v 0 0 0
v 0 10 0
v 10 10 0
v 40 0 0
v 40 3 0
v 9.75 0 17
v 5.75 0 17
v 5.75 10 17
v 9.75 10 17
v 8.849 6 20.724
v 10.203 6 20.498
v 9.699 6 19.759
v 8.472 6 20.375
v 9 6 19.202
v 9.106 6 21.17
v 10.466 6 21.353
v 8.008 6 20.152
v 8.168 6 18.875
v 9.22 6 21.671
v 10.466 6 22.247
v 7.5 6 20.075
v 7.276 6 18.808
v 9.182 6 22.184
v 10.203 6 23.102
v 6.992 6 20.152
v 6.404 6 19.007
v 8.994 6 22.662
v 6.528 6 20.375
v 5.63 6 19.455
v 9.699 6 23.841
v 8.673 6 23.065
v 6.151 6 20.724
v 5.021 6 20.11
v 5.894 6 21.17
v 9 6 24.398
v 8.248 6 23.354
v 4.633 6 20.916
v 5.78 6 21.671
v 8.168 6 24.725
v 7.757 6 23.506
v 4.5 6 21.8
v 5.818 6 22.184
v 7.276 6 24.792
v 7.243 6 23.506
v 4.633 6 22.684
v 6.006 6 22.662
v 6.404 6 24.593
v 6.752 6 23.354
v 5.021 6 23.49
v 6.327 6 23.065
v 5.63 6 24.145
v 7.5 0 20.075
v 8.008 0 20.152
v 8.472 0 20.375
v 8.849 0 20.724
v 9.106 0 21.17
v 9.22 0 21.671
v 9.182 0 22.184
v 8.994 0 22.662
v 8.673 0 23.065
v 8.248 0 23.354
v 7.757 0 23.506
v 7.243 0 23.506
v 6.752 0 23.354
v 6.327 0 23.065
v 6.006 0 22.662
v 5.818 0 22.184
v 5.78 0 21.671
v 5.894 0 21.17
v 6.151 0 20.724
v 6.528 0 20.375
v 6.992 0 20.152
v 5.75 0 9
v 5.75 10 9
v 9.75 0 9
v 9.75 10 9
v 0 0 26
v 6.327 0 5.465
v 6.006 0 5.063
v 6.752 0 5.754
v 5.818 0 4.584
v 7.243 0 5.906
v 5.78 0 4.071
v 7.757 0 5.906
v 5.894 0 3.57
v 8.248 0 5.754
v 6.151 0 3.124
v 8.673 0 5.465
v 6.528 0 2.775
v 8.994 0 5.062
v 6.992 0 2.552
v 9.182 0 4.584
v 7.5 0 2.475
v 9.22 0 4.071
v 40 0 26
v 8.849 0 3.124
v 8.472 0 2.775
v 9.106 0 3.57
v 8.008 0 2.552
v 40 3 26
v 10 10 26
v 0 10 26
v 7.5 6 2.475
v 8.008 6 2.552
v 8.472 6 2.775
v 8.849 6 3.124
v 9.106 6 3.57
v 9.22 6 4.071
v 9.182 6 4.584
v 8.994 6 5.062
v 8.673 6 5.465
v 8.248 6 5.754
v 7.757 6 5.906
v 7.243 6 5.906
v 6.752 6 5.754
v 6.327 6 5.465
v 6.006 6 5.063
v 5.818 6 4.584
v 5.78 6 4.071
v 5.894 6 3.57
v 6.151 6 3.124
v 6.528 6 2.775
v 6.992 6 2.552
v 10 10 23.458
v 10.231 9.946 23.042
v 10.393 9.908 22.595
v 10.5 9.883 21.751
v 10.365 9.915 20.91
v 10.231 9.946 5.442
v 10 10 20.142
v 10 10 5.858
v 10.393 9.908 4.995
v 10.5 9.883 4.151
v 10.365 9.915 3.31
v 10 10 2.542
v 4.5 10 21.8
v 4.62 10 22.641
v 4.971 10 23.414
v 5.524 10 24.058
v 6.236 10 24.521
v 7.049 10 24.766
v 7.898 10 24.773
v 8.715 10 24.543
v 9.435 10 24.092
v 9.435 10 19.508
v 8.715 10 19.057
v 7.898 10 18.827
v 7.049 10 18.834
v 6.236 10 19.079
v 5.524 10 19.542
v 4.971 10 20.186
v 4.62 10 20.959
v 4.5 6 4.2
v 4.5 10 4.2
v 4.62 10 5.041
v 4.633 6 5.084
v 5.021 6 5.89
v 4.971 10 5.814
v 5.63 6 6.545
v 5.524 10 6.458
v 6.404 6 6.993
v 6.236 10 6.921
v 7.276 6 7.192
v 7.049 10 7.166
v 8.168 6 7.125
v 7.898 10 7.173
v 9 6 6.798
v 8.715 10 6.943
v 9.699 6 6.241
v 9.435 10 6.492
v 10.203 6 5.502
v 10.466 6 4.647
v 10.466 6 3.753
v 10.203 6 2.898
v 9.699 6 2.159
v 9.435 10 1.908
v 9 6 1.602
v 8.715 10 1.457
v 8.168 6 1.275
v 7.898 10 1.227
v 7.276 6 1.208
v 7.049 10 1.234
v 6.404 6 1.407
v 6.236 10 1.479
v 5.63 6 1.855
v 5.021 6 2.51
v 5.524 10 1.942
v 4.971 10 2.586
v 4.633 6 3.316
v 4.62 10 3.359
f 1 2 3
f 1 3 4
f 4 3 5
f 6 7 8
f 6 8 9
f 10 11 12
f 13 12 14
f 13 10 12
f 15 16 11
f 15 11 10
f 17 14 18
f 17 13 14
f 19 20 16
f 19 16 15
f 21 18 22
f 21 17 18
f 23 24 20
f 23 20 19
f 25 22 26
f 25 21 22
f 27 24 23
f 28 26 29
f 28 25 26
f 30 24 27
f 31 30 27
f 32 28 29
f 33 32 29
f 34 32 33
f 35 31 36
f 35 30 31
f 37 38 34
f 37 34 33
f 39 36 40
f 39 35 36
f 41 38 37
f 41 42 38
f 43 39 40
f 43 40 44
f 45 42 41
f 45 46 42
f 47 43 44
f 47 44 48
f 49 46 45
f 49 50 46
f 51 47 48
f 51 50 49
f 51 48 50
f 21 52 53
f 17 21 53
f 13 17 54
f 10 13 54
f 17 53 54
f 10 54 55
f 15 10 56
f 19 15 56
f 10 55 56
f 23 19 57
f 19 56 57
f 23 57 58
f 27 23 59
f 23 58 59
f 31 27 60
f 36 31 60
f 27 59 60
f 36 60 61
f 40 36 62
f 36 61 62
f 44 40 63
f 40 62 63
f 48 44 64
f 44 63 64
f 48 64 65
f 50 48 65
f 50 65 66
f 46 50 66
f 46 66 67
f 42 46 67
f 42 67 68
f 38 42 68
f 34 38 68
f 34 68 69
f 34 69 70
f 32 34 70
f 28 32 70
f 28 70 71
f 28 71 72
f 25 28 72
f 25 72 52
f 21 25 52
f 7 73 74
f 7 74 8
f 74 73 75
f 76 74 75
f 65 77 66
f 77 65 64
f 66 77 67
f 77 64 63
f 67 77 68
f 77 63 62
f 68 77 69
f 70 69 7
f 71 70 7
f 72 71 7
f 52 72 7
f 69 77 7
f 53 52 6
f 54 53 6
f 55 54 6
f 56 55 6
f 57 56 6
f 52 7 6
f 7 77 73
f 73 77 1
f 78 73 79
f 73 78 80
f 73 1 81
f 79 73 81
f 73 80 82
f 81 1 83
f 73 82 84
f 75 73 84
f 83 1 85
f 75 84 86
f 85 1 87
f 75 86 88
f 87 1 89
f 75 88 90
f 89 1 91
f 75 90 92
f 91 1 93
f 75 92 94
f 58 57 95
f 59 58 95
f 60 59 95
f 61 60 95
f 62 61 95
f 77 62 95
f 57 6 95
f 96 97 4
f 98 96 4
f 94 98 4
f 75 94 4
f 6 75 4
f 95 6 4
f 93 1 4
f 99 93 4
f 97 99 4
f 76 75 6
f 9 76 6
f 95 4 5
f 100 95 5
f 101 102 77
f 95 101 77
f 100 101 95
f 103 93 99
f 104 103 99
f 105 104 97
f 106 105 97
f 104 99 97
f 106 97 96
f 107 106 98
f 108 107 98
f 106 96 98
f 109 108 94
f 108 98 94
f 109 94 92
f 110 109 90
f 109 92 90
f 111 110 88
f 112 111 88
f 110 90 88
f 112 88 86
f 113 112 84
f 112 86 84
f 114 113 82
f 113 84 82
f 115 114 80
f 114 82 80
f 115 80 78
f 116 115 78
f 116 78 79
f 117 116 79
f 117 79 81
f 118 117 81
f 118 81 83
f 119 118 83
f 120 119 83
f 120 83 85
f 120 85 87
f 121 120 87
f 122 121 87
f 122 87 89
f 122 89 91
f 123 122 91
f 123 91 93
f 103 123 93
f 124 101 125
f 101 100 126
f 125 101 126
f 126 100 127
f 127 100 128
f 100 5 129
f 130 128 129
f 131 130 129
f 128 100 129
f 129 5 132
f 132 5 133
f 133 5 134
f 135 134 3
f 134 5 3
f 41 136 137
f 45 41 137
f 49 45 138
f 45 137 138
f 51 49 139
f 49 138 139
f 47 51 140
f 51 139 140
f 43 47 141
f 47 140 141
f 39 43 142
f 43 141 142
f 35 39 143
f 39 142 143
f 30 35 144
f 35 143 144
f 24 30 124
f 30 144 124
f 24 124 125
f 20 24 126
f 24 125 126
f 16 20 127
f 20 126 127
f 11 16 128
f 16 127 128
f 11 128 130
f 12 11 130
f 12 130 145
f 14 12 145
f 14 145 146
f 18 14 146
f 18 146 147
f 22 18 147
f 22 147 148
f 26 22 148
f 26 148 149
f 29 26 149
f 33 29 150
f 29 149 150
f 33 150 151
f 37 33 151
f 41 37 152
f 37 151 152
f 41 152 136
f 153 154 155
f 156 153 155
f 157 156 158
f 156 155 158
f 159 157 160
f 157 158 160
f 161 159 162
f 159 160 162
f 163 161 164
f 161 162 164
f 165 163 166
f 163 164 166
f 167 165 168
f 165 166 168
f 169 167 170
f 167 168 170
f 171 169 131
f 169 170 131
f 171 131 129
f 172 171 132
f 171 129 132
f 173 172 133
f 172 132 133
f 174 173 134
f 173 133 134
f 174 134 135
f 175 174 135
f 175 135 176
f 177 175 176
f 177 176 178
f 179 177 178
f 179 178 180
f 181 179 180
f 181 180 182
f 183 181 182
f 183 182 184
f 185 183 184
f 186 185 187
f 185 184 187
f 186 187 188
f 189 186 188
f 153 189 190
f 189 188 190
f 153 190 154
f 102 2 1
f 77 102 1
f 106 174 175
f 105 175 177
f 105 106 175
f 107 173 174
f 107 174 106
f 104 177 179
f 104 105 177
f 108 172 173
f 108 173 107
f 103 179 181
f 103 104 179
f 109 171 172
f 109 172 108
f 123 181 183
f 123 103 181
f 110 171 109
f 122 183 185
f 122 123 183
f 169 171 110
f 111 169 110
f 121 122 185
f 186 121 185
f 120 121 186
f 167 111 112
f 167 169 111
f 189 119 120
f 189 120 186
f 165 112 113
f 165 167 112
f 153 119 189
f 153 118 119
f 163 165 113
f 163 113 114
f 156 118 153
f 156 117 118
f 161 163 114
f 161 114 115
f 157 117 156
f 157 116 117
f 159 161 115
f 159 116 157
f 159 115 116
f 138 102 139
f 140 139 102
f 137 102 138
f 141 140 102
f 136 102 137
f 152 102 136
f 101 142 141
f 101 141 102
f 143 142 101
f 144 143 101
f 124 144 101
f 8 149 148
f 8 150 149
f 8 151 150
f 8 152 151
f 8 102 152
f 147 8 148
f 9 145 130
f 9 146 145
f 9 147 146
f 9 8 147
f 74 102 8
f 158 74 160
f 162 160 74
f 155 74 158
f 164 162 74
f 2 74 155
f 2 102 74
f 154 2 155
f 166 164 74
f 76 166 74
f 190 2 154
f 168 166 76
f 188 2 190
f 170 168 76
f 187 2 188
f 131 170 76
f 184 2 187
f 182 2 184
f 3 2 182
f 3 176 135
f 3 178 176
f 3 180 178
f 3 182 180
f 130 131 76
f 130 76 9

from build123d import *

# Parameters (mm, degrees)
SKETCH1_W           = 40
SKETCH1_H           = 3
SKETCH1_W_2         = 10
SKETCH1_H_2         = 7
BOSS_EXTRUDE1_DEPTH = 26
SKETCH3_R           = 1.725
SKETCH3_W           = 4
SKETCH3_H           = 8
CUT_EXTRUDE1_DEPTH  = 49.744230428
SKETCH4_R           = 3
CUT_EXTRUDE2_DEPTH  = 4


with BuildPart() as part:
    # Sketch1 → Boss-Extrude1 (new body)
    with BuildSketch(Plane.XY):
        with Locations((20, 1.5)):
            Rectangle(SKETCH1_W, SKETCH1_H)
        Polygon((40, 3), (10, 10), (10, 3), align=None)
        with Locations((5, 6.5)):
            Rectangle(SKETCH1_W_2, SKETCH1_H_2)
    extrude(amount=BOSS_EXTRUDE1_DEPTH)

    # Sketch3 → Cut-Extrude1 (cut, through all)
    with BuildSketch(Plane.XZ):
        with Locations(Location((7.5, 21.8, 0), (0, 0, 270))):
            Circle(SKETCH3_R)
        with Locations(Location((7.5, 4.2, 0), (0, 0, 270))):
            Circle(SKETCH3_R)
        with Locations((7.75, 13)):
            Rectangle(SKETCH3_W, SKETCH3_H)
    extrude(amount=-CUT_EXTRUDE1_DEPTH, mode=Mode.SUBTRACT)

    # Sketch4 → Cut-Extrude2 (cut)
    with BuildSketch(Plane(origin=(0, 10, 0), x_dir=(1, 0, 0), z_dir=(0, 1, 0))):
        with Locations(Location((7.5, -4.2, 0), (0, 0, 180))):
            Circle(SKETCH4_R)
        with Locations(Location((7.5, -21.8, 0), (0, 0, 180))):
            Circle(SKETCH4_R)
    extrude(amount=-CUT_EXTRUDE2_DEPTH, mode=Mode.SUBTRACT)


solid = part.part
